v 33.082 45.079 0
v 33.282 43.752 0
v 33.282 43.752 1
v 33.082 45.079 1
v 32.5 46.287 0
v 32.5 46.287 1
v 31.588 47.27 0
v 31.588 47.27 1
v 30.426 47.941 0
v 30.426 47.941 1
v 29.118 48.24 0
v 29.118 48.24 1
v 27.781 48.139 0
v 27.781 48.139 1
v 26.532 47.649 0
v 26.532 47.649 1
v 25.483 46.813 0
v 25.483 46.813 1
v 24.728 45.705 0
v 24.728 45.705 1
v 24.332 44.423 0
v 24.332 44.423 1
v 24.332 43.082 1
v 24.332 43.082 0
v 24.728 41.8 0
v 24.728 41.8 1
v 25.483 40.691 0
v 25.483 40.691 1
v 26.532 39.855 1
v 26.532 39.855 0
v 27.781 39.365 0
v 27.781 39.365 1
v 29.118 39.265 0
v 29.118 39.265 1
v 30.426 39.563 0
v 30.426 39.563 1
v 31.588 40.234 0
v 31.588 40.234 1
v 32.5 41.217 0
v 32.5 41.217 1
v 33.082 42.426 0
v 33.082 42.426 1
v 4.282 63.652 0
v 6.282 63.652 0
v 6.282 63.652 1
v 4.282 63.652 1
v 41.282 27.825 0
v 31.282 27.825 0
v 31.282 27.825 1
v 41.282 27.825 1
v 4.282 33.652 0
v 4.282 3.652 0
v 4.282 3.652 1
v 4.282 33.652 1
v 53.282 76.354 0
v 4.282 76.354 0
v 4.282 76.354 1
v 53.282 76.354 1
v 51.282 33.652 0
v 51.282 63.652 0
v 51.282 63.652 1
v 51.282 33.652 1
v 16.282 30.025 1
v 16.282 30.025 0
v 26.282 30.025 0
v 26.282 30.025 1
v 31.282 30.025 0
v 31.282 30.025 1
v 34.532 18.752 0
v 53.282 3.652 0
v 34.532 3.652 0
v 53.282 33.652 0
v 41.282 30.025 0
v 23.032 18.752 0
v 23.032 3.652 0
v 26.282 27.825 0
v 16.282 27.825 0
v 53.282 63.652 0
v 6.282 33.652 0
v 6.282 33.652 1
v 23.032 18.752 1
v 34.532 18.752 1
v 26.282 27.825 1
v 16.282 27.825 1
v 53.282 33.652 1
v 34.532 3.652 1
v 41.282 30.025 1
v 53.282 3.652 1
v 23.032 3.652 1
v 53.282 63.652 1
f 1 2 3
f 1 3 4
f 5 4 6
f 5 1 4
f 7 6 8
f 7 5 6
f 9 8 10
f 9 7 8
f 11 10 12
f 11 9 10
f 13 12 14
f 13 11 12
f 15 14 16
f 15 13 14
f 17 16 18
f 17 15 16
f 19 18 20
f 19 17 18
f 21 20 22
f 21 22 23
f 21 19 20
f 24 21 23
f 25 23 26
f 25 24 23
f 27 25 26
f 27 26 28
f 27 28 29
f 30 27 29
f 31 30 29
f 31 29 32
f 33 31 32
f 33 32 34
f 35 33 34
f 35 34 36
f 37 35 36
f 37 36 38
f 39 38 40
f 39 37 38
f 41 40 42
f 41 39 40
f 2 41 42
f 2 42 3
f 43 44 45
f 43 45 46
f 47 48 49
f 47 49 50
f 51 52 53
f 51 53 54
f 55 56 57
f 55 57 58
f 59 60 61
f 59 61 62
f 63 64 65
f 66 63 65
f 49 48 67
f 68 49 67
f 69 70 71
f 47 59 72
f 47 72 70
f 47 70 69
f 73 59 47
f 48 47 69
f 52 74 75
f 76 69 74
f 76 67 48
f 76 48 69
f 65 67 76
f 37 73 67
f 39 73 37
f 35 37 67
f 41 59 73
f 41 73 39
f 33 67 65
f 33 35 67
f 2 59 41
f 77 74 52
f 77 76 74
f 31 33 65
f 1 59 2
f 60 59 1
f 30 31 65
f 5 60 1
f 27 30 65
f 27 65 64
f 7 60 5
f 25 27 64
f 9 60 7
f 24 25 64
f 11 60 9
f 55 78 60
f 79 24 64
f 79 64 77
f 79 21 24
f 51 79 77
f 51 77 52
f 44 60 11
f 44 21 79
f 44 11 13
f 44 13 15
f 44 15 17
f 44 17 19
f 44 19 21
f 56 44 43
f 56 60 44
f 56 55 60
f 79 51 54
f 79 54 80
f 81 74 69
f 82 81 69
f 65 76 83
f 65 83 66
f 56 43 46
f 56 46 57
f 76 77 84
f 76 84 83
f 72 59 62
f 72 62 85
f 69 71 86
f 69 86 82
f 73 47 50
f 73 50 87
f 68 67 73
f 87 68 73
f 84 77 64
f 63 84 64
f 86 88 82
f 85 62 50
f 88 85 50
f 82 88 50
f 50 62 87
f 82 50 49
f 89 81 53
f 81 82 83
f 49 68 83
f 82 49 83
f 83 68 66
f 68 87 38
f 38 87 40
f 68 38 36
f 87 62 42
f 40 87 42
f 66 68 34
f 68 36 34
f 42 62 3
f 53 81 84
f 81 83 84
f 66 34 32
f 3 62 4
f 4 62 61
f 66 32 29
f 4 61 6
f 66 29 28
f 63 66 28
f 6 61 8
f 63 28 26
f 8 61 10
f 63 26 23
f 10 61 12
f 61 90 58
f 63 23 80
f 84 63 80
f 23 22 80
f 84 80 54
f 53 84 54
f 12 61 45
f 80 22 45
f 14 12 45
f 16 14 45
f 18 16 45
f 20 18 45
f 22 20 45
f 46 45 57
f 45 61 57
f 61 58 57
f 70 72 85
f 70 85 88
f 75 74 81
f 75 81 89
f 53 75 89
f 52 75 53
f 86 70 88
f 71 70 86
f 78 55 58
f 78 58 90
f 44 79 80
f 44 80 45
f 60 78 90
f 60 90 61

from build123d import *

# Parameters (mm, degrees)
MODEL_R         = 4.5
MODEL_W         = 10
MODEL_H         = 2.2
EXTRUDE_1_DEPTH = 1


with BuildPart() as part:
    # Model → 凸台-拉伸1 (new body)
    with BuildSketch(Plane.XY):
        Polygon((4.28201841, 3.652217339), (4.28201841, 33.652217339), (6.28201841, 33.652217339), (6.28201841, 63.652217339), (4.28201841, 63.652217339), (4.28201841, 76.353862753), (53.28201841, 76.353862753), (53.28201841, 63.652217339), (51.28201841, 63.652217339), (51.28201841, 33.652217339), (53.28201841, 33.652217339), (53.28201841, 3.652217339), (34.53201841, 3.652217339), (34.53201841, 18.752217339), (28.78201841, 18.752217339), (23.03201841, 18.752217339), (23.03201841, 3.652217339), align=None)
        with Locations((28.78201841, 43.752217339)):
            Circle(MODEL_R, mode=Mode.SUBTRACT)
        with Locations((36.28201841, 28.925280735)):
            Rectangle(MODEL_W, MODEL_H, mode=Mode.SUBTRACT)
        with Locations((21.28201841, 28.925280735)):
            Rectangle(MODEL_W, MODEL_H, mode=Mode.SUBTRACT)
    extrude(amount=EXTRUDE_1_DEPTH)


solid = part.part
